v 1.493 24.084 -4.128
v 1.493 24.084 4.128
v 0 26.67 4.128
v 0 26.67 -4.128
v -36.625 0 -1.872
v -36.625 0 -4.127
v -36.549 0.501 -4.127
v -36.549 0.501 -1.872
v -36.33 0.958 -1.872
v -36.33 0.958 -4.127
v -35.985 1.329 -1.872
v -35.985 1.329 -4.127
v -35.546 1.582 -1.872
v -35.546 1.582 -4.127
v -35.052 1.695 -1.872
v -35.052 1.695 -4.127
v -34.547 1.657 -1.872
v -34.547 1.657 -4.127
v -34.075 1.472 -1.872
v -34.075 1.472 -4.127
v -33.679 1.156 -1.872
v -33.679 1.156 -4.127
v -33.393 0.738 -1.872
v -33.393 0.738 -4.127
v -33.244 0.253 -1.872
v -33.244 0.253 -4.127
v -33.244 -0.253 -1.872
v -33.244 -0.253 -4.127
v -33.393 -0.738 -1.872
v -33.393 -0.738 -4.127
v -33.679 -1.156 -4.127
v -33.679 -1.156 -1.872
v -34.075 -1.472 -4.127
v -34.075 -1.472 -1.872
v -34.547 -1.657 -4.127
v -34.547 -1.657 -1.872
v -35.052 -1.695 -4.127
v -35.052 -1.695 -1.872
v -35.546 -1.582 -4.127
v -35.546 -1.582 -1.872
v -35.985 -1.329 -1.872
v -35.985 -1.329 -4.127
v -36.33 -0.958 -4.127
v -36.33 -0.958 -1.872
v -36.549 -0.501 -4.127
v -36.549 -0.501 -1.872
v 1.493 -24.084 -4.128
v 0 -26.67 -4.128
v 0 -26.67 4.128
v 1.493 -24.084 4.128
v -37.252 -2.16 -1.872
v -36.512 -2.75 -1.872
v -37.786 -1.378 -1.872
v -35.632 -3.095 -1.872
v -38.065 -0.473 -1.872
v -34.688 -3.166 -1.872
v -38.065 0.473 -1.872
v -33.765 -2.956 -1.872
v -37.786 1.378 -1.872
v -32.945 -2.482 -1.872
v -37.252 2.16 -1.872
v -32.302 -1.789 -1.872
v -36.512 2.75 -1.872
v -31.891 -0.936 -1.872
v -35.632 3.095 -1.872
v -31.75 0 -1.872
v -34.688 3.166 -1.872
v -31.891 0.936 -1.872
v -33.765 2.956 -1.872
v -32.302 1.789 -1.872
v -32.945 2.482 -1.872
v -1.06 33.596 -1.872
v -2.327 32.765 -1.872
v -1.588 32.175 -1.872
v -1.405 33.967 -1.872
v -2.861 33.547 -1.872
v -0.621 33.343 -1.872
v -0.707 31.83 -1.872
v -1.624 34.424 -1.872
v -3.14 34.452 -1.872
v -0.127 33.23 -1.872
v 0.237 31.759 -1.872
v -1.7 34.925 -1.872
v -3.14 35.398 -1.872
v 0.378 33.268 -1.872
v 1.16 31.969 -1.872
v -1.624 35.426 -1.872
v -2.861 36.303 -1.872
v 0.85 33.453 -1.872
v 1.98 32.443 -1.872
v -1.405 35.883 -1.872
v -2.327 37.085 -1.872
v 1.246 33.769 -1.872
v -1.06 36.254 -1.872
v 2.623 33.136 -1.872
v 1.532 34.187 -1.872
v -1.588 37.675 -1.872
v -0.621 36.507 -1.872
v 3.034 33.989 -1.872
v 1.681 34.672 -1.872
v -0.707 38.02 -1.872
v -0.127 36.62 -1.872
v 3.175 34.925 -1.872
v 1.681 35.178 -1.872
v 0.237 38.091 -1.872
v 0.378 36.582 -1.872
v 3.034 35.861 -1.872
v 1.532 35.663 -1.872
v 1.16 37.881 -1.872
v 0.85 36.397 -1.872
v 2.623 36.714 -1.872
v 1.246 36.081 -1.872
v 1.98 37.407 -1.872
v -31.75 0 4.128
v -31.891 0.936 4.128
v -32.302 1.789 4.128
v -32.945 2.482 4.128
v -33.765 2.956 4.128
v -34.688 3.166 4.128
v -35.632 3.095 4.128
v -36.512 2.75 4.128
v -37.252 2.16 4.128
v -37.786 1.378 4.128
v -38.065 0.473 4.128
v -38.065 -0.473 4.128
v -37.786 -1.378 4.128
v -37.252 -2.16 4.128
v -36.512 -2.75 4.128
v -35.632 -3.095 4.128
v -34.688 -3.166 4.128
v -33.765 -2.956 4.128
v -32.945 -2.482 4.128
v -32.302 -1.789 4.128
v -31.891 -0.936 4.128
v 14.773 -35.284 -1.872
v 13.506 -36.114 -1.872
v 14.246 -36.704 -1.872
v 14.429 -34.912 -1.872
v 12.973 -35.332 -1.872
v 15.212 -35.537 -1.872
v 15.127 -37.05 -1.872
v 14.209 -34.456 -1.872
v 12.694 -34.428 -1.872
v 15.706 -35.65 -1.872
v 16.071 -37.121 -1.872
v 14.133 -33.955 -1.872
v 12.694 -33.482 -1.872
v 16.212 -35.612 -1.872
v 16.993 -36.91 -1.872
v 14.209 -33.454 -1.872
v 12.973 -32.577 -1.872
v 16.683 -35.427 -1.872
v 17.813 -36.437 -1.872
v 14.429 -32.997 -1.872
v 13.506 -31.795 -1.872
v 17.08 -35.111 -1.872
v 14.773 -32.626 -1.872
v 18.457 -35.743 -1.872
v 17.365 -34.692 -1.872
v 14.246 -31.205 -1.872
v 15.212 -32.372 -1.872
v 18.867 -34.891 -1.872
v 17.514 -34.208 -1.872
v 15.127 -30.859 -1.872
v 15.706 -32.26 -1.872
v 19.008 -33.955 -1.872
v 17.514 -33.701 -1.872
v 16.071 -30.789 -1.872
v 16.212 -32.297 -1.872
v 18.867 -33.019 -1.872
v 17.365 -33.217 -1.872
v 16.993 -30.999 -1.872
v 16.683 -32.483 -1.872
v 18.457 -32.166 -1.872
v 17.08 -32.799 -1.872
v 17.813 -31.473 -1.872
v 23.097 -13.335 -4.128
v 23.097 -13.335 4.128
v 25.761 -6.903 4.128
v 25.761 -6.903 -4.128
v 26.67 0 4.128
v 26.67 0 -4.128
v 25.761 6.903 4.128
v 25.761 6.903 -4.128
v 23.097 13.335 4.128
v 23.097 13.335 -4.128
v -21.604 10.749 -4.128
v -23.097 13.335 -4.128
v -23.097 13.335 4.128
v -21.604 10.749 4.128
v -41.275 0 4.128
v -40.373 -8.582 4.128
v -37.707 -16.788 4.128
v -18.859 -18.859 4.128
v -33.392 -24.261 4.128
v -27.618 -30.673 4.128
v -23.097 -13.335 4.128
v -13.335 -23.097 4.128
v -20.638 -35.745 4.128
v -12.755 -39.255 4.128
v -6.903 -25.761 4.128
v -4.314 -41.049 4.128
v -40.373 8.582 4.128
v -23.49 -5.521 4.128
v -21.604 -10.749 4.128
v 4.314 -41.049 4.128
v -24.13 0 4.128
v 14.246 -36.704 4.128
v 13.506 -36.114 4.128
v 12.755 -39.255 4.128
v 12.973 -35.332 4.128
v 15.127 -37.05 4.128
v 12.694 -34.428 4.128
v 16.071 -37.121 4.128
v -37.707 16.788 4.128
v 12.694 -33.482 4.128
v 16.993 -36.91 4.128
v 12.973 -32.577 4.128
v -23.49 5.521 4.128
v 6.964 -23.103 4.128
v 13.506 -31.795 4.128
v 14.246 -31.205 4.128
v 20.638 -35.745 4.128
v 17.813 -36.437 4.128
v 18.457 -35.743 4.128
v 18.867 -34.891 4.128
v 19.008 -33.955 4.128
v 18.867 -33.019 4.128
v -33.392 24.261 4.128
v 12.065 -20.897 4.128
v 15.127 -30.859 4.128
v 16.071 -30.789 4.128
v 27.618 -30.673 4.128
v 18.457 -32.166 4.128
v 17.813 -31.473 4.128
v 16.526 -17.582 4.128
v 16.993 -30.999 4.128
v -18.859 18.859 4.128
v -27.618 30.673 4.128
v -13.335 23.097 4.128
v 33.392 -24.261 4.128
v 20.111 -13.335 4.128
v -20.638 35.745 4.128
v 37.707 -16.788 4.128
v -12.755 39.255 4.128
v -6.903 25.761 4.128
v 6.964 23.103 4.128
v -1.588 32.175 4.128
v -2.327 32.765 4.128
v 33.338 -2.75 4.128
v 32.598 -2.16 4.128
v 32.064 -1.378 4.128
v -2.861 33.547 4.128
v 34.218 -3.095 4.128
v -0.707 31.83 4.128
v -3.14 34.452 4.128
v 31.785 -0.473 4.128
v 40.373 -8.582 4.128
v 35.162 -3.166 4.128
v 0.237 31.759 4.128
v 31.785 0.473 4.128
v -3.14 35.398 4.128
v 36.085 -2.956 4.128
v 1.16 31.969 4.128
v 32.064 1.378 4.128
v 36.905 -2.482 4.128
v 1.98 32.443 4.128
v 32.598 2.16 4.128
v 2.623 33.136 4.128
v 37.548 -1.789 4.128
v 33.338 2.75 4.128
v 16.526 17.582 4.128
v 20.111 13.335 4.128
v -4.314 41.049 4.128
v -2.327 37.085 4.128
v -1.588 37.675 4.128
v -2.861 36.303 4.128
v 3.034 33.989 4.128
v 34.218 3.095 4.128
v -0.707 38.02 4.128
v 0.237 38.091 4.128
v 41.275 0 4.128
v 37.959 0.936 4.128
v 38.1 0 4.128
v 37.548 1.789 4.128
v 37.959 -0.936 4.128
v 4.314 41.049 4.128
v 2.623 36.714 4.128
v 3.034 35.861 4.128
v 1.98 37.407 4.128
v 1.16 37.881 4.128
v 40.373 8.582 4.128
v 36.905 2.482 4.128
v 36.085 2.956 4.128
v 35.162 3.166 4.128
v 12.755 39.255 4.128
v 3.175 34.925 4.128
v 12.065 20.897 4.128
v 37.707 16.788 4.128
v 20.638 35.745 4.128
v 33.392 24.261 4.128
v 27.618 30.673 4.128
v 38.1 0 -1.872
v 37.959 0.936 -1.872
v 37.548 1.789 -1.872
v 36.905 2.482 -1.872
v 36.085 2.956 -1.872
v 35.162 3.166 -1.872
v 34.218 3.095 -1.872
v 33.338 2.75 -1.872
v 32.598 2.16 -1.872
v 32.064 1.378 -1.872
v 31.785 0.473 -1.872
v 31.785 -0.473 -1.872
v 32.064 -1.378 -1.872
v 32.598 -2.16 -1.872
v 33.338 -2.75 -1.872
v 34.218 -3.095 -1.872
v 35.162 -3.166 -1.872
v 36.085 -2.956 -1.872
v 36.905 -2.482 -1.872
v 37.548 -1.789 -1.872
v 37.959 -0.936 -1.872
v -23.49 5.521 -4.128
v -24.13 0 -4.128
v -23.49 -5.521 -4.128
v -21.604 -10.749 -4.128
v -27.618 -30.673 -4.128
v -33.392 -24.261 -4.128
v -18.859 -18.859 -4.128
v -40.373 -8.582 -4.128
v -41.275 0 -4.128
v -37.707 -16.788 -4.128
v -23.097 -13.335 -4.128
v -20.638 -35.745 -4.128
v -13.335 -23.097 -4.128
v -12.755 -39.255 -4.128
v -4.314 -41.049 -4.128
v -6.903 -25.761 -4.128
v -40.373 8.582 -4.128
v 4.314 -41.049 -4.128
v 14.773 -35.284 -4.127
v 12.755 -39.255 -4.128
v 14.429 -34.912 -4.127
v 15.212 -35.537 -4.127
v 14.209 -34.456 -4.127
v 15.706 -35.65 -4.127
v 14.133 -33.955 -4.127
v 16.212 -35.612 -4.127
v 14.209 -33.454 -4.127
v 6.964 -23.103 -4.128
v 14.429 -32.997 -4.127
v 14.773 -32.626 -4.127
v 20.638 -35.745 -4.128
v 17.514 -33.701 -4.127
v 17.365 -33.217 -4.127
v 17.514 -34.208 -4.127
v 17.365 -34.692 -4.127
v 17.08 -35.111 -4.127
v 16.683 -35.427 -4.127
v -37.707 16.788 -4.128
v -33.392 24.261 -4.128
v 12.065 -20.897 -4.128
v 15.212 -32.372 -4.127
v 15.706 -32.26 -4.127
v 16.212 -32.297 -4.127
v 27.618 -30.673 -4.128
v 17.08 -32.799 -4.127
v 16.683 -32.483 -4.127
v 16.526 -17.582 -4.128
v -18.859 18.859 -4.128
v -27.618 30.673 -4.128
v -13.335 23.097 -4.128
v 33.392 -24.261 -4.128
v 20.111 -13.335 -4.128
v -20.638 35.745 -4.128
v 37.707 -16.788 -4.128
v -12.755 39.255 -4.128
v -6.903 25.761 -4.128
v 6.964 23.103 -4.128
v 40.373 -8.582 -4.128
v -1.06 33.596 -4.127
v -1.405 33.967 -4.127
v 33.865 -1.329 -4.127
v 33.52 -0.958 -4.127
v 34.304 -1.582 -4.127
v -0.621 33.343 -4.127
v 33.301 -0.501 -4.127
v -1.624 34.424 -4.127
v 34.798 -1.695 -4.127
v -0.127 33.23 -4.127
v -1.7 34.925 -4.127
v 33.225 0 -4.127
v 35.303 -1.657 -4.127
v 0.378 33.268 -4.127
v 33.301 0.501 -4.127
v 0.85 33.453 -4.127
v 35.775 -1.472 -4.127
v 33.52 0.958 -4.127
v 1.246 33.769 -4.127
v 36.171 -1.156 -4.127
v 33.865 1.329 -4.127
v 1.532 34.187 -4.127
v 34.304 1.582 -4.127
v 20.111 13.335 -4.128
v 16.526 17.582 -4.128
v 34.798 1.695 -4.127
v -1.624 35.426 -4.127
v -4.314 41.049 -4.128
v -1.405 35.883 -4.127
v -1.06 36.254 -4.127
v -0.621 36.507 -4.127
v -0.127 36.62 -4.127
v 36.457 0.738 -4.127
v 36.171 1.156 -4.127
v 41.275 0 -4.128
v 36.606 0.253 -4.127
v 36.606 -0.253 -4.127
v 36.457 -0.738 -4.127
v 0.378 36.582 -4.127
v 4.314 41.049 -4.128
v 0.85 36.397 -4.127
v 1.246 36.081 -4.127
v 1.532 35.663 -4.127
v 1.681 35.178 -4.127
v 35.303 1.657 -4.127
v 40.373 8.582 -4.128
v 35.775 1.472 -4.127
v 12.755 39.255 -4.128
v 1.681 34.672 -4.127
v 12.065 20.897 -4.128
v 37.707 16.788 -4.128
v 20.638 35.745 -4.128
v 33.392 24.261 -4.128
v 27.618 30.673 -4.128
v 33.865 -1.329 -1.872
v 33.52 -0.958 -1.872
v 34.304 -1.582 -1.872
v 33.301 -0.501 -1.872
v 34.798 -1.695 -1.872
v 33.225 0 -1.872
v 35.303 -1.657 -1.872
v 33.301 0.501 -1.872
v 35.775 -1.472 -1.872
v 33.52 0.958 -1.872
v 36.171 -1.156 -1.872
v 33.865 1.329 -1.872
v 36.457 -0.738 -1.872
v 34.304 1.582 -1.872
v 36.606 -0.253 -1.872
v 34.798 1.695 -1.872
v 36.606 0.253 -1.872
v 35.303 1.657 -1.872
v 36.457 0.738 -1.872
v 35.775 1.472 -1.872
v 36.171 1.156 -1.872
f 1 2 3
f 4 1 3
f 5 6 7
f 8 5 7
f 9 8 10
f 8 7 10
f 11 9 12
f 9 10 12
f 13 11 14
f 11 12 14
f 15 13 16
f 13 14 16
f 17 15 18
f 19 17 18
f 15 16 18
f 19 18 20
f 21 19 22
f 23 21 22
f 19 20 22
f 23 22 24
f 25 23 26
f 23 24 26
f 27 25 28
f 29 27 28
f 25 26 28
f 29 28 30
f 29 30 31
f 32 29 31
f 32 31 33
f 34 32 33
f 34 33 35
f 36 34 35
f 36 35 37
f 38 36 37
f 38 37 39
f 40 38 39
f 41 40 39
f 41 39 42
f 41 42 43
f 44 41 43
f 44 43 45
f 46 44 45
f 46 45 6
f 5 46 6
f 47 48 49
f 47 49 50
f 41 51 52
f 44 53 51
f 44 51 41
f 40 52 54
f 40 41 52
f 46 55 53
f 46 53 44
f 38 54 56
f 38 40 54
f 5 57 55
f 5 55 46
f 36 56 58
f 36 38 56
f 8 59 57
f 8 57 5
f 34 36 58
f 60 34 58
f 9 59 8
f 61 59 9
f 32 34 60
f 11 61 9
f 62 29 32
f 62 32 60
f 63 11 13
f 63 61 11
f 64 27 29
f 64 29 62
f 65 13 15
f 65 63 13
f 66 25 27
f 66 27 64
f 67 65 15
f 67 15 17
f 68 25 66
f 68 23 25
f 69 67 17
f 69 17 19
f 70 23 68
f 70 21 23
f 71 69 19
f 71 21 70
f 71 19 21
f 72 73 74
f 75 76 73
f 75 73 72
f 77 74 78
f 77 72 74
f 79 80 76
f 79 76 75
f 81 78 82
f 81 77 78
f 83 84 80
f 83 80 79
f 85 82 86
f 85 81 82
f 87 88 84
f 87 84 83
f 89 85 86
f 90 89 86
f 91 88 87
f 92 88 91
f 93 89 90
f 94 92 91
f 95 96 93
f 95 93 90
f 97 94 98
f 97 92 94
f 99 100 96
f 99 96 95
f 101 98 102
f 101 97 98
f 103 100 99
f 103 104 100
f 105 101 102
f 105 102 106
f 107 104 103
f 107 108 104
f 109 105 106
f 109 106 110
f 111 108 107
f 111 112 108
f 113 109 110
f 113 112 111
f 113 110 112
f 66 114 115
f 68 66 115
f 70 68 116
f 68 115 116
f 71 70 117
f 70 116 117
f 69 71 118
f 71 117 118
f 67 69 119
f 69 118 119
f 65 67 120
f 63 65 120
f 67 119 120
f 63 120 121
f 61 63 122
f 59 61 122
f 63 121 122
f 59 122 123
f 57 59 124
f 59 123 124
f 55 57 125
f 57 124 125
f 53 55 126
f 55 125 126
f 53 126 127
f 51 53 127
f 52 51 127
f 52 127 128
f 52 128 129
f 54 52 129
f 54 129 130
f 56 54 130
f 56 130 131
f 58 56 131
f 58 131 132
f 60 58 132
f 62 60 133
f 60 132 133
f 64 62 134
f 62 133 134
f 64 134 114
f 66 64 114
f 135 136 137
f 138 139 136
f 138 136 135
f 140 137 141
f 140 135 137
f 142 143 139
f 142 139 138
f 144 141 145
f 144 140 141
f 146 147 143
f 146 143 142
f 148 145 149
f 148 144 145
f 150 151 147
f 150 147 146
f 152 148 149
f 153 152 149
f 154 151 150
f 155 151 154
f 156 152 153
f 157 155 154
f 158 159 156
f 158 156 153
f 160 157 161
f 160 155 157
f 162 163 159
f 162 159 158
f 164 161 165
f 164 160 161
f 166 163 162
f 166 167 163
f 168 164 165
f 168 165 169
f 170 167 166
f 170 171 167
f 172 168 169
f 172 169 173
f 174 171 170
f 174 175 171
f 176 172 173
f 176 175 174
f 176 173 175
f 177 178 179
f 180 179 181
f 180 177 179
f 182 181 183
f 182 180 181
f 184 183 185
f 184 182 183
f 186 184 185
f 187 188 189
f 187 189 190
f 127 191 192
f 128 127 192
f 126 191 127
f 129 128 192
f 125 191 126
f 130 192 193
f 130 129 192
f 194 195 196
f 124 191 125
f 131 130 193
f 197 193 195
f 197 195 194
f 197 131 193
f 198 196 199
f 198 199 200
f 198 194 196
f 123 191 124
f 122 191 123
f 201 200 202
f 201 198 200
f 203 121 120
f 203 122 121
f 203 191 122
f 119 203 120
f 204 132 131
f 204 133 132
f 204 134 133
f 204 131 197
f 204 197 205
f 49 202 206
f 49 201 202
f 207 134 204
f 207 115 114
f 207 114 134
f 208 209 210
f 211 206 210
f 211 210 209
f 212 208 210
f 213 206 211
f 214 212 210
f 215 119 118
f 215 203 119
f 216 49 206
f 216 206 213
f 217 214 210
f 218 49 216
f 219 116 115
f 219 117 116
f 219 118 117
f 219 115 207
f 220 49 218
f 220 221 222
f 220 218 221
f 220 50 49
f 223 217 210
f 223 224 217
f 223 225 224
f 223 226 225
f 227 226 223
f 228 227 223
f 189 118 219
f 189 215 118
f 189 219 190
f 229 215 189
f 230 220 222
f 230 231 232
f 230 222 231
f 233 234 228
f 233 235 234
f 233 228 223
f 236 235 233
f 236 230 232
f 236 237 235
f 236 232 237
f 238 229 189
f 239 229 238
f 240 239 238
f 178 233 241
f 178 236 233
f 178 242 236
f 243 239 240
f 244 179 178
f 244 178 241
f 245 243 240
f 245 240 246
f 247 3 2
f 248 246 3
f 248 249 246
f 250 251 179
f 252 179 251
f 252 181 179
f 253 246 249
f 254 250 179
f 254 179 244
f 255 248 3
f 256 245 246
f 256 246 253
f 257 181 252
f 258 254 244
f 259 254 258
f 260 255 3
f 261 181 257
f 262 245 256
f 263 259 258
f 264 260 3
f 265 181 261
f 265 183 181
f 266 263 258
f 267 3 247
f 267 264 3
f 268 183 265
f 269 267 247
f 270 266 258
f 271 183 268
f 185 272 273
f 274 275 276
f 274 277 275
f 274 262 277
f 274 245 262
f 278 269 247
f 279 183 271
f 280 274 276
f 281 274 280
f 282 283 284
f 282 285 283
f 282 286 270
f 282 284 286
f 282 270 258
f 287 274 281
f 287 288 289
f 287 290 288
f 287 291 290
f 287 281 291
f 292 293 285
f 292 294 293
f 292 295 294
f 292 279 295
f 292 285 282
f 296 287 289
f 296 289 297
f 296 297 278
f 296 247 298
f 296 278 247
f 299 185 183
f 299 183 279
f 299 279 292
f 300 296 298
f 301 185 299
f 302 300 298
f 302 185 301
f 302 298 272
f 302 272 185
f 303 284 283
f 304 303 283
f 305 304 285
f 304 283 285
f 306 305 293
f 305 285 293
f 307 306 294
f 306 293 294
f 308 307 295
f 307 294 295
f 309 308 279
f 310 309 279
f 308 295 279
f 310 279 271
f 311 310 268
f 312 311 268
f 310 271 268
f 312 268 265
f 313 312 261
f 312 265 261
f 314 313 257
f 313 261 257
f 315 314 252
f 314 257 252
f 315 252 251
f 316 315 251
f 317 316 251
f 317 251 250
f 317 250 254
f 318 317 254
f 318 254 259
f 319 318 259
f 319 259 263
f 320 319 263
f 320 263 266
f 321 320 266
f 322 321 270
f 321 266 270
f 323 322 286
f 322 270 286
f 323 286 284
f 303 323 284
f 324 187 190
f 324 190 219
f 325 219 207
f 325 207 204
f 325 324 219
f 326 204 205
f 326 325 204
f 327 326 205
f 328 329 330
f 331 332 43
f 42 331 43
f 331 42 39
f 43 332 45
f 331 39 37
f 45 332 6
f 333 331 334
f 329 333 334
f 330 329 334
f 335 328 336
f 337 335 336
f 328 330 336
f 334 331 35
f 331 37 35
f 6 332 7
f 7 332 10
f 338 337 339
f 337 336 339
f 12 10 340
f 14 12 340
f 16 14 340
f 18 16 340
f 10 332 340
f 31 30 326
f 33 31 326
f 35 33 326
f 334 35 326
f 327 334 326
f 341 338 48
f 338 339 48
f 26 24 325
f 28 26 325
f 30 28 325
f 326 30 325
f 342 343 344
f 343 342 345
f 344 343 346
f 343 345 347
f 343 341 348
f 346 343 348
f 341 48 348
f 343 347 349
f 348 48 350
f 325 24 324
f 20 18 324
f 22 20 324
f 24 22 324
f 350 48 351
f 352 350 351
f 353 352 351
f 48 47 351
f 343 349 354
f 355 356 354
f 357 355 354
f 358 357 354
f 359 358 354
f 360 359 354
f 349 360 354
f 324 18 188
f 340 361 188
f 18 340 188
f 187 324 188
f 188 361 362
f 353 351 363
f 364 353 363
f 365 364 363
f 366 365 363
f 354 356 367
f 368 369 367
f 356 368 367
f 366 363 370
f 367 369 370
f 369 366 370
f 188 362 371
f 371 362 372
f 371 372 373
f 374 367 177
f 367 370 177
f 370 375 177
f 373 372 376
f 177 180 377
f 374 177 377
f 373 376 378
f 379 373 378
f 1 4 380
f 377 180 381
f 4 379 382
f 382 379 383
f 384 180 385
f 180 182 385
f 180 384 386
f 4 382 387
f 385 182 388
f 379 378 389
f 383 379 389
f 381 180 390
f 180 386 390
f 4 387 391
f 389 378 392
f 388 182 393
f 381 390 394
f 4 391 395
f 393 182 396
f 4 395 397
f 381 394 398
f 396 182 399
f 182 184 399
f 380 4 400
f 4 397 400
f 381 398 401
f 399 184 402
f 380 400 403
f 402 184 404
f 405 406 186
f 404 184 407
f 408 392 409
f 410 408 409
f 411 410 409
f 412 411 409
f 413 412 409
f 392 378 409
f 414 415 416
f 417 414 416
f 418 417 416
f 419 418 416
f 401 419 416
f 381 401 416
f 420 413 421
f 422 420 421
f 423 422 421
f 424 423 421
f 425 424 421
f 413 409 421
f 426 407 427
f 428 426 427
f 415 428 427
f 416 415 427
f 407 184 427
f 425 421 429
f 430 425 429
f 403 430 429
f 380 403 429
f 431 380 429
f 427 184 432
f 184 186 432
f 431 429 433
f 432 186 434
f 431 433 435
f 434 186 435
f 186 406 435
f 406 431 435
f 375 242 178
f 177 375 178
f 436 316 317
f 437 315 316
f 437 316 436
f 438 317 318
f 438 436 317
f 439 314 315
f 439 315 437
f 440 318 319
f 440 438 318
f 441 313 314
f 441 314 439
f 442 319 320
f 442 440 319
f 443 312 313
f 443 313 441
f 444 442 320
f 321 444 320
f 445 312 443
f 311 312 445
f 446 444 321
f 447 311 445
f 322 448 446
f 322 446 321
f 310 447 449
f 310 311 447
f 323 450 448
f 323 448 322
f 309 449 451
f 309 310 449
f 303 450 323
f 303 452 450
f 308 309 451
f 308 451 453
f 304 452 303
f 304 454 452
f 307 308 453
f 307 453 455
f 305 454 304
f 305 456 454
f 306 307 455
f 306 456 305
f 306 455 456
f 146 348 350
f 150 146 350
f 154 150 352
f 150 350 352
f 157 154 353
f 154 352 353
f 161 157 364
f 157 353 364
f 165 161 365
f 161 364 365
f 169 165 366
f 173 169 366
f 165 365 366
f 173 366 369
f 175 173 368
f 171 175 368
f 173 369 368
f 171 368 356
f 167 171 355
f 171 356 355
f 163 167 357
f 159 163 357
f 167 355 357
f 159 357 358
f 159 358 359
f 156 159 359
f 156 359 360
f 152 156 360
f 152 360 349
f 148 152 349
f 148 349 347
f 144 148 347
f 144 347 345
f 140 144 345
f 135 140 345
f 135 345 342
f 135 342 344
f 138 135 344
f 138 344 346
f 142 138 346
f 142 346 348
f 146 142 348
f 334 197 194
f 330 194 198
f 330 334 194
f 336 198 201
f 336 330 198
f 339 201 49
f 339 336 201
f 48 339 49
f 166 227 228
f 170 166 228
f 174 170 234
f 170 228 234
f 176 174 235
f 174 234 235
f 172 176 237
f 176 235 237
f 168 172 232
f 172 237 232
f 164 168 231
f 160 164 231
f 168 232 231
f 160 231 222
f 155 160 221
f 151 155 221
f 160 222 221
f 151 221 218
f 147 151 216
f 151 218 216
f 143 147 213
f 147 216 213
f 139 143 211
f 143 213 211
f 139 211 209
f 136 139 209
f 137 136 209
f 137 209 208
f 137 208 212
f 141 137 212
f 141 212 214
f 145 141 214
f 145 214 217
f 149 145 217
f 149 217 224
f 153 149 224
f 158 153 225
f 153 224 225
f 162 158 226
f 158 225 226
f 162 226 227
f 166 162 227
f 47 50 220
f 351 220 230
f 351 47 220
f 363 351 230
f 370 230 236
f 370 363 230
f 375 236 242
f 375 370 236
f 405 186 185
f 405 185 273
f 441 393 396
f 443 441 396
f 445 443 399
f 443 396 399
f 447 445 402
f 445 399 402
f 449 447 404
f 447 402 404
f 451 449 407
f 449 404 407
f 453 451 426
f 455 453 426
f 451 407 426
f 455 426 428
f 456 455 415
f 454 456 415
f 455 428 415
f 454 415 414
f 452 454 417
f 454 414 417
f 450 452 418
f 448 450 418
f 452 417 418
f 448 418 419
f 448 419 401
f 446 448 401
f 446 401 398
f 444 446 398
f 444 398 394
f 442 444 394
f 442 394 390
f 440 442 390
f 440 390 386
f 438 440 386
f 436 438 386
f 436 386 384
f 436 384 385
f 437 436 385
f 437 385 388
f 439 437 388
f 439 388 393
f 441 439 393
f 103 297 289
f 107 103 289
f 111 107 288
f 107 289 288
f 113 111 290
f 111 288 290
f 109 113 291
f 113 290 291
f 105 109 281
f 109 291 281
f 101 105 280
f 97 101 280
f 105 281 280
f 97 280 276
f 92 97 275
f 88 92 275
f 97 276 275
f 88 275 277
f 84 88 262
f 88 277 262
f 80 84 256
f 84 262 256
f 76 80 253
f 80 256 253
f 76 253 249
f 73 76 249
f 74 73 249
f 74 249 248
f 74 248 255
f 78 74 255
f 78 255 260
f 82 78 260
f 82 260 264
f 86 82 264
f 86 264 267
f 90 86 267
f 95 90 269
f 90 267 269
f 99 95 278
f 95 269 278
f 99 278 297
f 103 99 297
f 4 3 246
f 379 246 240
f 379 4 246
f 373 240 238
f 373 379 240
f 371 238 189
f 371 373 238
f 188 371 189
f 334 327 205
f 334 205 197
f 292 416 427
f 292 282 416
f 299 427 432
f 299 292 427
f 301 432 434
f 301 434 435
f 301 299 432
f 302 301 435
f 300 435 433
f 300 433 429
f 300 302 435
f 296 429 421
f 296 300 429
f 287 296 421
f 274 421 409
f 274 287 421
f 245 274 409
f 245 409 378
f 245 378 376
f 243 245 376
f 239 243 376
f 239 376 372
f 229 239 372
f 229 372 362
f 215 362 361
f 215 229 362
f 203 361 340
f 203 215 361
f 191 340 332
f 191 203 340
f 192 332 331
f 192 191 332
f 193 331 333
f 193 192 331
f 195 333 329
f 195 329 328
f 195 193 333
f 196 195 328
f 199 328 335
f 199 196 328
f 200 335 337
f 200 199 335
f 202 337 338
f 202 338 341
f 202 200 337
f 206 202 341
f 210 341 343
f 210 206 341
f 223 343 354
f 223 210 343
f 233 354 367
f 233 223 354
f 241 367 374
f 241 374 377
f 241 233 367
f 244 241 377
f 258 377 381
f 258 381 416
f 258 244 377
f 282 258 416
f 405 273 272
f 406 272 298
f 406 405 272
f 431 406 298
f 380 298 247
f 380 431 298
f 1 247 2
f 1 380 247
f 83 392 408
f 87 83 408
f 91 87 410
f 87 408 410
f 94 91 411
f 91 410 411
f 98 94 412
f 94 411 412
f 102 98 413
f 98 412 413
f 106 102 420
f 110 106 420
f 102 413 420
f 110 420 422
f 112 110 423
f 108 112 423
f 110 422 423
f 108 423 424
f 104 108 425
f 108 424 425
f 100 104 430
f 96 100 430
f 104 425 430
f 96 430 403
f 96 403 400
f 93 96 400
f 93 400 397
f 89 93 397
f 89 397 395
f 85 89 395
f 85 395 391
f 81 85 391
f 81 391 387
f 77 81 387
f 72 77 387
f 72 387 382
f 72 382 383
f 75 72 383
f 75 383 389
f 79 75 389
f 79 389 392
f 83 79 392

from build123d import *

# Parameters (mm, degrees)
SKETCH1_R                  = 41.275
SKETCH1_R_2                = 24.13
BOSS_EXTRUDE1_DEPTH        = 4.1275
F_3_4_3_4_DIAMETER_HOLE1_D = 3.4
CUT_EXTRUDE2_DEPTH         = 59.952491678
CIRPATTERN1_COUNT          = 3
F_3_4_3_4_DIAMETER_HOLE2_D = 3.4
SKETCH8_R                  = 3.175
CUT_EXTRUDE3_DEPTH         = 5.999999906


with BuildPart() as part:
    # Sketch1 → Boss-Extrude1 (new, symmetric)
    with BuildSketch(Plane.XY):
        Circle(SKETCH1_R)
        Circle(SKETCH1_R_2, mode=Mode.SUBTRACT)
    extrude(amount=BOSS_EXTRUDE1_DEPTH, both=True)

    # Ø3.4 (3.4) Diameter Hole1 (through all)
    with Locations(Plane.XY.offset(4.1275)):
        with Locations((-34.925, 0), (0, 34.925), (34.925, 0)):
            Hole(F_3_4_3_4_DIAMETER_HOLE1_D / 2)

    # Sketch5 → Cut-Extrude2 (cut, through all)
    with BuildSketch(Plane(origin=(0, 0, -4.1275), x_dir=(-1, 0, 0), z_dir=(0, 0, -1))):
        with BuildLine():
            Line((-23.096897519, 13.335), (0, 13.335))
            Line((0, 13.335), (0, -13.335))
            Line((0, -13.335), (-23.096897519, -13.335))
            ThreePointArc((-23.096897519, -13.335), (-26.67, 0), (-23.096897519, 13.335))
        make_face()
    cut_extrude2 = extrude(amount=-CUT_EXTRUDE2_DEPTH, mode=Mode.SUBTRACT)

    # CirPattern1: Cut-Extrude2 ×3 about axis
    cirpattern1_axis = Axis((0, 0, 0), (0, 0, 1))
    for i in range(1, CIRPATTERN1_COUNT):
        add(cut_extrude2.rotate(cirpattern1_axis, i * 360 / CIRPATTERN1_COUNT), mode=Mode.SUBTRACT)

    # Ø3.4 (3.4) Diameter Hole2 (through all)
    with Locations(Plane.XY.offset(4.1275)):
        with Locations((15.833393176, -33.954821241)):
            Hole(F_3_4_3_4_DIAMETER_HOLE2_D / 2)

    # Sketch8 → Cut-Extrude3 (cut)
    with BuildSketch(Plane.XY.offset(4.1275)):
        with Locations((0, 34.925)):
            Circle(SKETCH8_R)
        with Locations((34.925, 0)):
            Circle(SKETCH8_R)
        with Locations((15.833393176, -33.954821241)):
            Circle(SKETCH8_R)
        with Locations((-34.925, 0)):
            Circle(SKETCH8_R)
    extrude(amount=-CUT_EXTRUDE3_DEPTH, mode=Mode.SUBTRACT)


solid = part.part
